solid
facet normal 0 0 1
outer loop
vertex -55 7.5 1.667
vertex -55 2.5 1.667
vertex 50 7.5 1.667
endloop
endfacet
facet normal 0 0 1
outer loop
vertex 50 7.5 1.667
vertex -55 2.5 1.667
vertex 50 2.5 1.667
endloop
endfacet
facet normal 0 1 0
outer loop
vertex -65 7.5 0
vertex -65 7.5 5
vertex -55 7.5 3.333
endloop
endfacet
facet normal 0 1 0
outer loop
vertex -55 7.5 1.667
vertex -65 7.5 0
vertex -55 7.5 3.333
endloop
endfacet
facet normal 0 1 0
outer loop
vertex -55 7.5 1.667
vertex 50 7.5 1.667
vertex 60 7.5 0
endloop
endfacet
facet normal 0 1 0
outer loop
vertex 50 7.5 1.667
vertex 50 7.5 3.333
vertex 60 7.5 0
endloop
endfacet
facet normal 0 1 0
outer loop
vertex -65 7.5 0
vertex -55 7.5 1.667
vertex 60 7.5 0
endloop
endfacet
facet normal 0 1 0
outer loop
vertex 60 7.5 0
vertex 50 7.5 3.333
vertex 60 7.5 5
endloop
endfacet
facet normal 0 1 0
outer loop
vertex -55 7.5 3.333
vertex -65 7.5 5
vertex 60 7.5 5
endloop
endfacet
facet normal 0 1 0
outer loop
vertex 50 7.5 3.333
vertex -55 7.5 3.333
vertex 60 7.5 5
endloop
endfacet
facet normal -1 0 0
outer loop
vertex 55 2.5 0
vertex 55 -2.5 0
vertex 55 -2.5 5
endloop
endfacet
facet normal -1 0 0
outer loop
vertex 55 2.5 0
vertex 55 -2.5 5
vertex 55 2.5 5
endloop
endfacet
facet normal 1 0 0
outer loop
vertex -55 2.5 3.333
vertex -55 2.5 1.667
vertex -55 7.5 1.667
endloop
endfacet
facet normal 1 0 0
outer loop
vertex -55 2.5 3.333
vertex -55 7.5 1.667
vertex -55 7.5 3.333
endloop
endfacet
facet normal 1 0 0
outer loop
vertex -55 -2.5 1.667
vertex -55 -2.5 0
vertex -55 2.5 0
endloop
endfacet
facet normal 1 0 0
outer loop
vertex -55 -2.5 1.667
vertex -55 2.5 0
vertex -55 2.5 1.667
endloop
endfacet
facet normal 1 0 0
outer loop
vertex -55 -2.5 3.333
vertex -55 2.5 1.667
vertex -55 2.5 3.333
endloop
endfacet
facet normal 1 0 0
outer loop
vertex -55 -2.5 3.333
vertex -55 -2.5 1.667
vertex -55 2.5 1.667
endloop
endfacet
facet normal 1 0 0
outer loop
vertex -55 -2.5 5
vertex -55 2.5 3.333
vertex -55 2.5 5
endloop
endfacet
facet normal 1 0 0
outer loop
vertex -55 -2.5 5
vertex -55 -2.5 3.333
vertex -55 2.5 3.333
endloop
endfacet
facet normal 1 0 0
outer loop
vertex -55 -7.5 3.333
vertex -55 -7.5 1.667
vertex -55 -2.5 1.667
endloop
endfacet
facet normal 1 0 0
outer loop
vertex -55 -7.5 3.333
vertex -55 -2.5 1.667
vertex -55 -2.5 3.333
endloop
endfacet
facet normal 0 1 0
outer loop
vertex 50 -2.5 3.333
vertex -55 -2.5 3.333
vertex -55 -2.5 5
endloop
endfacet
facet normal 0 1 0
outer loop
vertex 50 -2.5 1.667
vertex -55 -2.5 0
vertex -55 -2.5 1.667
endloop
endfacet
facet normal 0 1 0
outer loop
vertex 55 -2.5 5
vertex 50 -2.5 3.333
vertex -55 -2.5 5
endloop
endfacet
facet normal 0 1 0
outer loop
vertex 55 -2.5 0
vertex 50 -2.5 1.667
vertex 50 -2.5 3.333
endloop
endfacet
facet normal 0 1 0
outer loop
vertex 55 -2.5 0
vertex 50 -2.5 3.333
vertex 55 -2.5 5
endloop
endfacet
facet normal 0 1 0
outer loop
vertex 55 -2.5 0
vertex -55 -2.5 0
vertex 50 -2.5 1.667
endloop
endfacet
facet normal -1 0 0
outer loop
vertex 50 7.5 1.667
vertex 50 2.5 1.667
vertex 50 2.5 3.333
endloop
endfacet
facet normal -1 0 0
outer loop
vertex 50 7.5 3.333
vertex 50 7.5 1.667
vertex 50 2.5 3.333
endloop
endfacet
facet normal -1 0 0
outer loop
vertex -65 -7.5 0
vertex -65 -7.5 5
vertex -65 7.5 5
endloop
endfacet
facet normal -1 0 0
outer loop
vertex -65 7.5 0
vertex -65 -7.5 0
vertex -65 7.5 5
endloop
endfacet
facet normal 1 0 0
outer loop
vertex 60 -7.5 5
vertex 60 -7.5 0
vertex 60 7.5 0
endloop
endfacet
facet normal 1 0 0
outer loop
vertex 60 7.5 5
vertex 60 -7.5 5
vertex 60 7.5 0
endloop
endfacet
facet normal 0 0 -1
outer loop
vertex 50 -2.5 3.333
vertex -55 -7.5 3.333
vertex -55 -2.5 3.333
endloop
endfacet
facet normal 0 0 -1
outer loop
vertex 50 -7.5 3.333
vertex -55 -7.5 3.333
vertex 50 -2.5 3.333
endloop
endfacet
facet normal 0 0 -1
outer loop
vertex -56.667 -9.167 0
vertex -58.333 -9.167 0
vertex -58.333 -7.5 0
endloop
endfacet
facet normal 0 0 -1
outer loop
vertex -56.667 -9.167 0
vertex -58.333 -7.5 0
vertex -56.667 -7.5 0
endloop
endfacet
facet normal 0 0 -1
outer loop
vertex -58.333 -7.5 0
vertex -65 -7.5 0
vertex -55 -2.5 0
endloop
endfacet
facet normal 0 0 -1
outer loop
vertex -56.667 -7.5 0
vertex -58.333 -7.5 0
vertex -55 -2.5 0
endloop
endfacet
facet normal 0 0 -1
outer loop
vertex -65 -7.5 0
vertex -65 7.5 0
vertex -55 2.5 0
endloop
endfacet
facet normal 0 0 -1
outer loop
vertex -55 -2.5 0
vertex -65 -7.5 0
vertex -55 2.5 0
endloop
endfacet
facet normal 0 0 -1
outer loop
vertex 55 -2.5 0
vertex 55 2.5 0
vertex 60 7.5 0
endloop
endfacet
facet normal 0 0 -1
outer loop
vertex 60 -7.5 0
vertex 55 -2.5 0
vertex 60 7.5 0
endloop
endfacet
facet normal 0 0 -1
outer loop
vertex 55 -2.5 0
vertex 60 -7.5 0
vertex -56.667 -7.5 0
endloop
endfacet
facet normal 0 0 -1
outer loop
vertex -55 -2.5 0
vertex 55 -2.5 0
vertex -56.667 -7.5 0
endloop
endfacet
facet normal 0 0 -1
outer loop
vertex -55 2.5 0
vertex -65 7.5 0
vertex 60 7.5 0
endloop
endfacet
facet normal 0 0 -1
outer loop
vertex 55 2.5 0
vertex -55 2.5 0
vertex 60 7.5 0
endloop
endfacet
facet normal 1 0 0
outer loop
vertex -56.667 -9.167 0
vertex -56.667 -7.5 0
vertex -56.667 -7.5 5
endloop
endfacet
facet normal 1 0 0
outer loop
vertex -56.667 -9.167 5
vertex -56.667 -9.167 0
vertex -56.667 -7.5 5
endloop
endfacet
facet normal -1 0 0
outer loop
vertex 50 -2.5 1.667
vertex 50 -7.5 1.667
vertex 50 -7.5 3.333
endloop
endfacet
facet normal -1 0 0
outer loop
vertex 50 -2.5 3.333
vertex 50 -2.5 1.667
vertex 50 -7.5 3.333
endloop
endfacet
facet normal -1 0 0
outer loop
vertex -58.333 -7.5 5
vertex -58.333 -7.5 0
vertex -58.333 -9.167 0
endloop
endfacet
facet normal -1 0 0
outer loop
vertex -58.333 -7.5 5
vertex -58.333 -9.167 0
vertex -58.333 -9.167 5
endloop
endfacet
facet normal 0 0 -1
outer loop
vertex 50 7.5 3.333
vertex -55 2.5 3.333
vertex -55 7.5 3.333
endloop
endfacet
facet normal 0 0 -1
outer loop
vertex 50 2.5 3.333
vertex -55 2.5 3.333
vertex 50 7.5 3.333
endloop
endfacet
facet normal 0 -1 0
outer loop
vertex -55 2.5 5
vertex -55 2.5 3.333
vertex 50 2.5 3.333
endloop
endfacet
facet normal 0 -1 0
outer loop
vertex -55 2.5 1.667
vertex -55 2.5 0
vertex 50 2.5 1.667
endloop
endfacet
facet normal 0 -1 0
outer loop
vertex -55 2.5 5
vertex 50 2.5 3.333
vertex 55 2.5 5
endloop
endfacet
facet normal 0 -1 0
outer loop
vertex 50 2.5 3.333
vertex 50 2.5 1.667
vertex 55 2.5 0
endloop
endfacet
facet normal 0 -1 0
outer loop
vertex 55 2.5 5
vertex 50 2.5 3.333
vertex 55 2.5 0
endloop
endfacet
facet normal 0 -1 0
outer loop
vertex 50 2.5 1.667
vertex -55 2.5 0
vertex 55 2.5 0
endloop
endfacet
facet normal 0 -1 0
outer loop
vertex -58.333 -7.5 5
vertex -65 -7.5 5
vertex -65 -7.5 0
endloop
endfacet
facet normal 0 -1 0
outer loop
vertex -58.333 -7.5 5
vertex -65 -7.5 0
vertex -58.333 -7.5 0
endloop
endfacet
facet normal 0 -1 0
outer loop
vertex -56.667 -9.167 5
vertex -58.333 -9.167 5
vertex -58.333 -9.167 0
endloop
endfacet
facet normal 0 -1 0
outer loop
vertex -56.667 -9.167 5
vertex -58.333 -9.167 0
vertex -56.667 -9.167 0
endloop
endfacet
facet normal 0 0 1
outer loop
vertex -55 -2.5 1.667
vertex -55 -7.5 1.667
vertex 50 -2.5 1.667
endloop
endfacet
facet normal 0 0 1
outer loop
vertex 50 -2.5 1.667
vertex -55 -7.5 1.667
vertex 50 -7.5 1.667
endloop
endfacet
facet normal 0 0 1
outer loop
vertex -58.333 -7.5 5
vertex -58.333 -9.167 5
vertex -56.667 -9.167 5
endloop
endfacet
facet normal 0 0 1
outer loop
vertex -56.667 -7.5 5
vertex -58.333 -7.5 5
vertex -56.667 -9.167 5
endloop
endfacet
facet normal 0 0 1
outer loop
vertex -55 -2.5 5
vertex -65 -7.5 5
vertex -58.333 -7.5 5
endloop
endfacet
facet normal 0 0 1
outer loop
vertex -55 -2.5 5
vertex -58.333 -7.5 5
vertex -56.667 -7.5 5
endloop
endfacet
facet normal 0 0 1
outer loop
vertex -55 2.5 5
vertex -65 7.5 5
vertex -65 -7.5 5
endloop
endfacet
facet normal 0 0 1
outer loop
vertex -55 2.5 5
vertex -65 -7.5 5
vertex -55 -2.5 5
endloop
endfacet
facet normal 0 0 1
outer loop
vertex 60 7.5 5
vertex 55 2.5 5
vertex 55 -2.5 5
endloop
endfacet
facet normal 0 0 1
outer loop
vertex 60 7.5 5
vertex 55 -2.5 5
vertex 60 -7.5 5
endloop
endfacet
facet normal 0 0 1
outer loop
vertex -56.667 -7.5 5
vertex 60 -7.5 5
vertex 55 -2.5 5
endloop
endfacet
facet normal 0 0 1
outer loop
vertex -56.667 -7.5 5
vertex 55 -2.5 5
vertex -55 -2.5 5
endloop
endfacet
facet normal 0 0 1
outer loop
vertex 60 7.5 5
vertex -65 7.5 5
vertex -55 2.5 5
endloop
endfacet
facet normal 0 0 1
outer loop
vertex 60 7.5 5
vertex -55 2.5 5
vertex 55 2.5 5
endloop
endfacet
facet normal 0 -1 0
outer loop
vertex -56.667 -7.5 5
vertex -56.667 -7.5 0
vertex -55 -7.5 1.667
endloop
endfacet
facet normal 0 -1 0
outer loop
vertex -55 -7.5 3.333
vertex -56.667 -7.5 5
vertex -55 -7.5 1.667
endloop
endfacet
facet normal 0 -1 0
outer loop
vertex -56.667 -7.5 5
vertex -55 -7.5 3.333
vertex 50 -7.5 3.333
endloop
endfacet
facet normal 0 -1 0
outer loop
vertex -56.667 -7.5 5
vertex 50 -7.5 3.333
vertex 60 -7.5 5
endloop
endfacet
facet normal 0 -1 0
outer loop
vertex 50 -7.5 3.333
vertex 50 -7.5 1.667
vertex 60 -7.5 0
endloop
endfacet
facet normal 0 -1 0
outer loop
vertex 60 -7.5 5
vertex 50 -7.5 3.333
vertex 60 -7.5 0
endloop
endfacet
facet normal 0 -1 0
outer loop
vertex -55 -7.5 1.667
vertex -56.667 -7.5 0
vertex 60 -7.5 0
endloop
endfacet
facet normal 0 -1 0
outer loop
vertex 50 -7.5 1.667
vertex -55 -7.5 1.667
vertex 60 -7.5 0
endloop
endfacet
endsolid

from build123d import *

# Parameters (mm, degrees)
SKETCH1_W              = 120
SKETCH1_H              = 15
SKETCH1_W_2            = 110
SKETCH1_H_2            = 5
SLIDER_MAIN_BODY_DEPTH = 5
SKETCH2_W              = 1.666666666
SKETCH2_H              = 5
TRACK_SLIDER_DEPTH     = 1.666666667
SKETCH3_W              = 5
SKETCH3_H              = 15
HANDLE_DEPTH           = 5
SKETCH5_W              = 105
SKETCH5_H              = 1.666666666
CUT_EXTRUDE1_DEPTH     = 67.895440801


with BuildPart() as part:
    # Sketch1 → Slider Main Body (new body)
    with BuildSketch(Plane.XY):
        Rectangle(SKETCH1_W, SKETCH1_H)
        Rectangle(SKETCH1_W_2, SKETCH1_H_2, mode=Mode.SUBTRACT)
    extrude(amount=SLIDER_MAIN_BODY_DEPTH)

    # Sketch2 → Track Slider (add)
    with BuildSketch(Plane.XZ.offset(7.5)):
        with Locations((-57.5, 2.5)):
            Rectangle(SKETCH2_W, SKETCH2_H)
    extrude(amount=TRACK_SLIDER_DEPTH)

    # Sketch3 → Handle (add)
    with BuildSketch(Plane.XY.offset(5)):
        with Locations((-62.5, 0)):
            Rectangle(SKETCH3_W, SKETCH3_H)
    extrude(amount=-HANDLE_DEPTH)

    # Sketch5 → Cut-Extrude1 (cut, through all)
    with BuildSketch(Plane.XZ.offset(7.5)):
        with Locations((-2.5, 2.5)):
            Rectangle(SKETCH5_W, SKETCH5_H)
    extrude(amount=-CUT_EXTRUDE1_DEPTH, mode=Mode.SUBTRACT)


solid = part.part
